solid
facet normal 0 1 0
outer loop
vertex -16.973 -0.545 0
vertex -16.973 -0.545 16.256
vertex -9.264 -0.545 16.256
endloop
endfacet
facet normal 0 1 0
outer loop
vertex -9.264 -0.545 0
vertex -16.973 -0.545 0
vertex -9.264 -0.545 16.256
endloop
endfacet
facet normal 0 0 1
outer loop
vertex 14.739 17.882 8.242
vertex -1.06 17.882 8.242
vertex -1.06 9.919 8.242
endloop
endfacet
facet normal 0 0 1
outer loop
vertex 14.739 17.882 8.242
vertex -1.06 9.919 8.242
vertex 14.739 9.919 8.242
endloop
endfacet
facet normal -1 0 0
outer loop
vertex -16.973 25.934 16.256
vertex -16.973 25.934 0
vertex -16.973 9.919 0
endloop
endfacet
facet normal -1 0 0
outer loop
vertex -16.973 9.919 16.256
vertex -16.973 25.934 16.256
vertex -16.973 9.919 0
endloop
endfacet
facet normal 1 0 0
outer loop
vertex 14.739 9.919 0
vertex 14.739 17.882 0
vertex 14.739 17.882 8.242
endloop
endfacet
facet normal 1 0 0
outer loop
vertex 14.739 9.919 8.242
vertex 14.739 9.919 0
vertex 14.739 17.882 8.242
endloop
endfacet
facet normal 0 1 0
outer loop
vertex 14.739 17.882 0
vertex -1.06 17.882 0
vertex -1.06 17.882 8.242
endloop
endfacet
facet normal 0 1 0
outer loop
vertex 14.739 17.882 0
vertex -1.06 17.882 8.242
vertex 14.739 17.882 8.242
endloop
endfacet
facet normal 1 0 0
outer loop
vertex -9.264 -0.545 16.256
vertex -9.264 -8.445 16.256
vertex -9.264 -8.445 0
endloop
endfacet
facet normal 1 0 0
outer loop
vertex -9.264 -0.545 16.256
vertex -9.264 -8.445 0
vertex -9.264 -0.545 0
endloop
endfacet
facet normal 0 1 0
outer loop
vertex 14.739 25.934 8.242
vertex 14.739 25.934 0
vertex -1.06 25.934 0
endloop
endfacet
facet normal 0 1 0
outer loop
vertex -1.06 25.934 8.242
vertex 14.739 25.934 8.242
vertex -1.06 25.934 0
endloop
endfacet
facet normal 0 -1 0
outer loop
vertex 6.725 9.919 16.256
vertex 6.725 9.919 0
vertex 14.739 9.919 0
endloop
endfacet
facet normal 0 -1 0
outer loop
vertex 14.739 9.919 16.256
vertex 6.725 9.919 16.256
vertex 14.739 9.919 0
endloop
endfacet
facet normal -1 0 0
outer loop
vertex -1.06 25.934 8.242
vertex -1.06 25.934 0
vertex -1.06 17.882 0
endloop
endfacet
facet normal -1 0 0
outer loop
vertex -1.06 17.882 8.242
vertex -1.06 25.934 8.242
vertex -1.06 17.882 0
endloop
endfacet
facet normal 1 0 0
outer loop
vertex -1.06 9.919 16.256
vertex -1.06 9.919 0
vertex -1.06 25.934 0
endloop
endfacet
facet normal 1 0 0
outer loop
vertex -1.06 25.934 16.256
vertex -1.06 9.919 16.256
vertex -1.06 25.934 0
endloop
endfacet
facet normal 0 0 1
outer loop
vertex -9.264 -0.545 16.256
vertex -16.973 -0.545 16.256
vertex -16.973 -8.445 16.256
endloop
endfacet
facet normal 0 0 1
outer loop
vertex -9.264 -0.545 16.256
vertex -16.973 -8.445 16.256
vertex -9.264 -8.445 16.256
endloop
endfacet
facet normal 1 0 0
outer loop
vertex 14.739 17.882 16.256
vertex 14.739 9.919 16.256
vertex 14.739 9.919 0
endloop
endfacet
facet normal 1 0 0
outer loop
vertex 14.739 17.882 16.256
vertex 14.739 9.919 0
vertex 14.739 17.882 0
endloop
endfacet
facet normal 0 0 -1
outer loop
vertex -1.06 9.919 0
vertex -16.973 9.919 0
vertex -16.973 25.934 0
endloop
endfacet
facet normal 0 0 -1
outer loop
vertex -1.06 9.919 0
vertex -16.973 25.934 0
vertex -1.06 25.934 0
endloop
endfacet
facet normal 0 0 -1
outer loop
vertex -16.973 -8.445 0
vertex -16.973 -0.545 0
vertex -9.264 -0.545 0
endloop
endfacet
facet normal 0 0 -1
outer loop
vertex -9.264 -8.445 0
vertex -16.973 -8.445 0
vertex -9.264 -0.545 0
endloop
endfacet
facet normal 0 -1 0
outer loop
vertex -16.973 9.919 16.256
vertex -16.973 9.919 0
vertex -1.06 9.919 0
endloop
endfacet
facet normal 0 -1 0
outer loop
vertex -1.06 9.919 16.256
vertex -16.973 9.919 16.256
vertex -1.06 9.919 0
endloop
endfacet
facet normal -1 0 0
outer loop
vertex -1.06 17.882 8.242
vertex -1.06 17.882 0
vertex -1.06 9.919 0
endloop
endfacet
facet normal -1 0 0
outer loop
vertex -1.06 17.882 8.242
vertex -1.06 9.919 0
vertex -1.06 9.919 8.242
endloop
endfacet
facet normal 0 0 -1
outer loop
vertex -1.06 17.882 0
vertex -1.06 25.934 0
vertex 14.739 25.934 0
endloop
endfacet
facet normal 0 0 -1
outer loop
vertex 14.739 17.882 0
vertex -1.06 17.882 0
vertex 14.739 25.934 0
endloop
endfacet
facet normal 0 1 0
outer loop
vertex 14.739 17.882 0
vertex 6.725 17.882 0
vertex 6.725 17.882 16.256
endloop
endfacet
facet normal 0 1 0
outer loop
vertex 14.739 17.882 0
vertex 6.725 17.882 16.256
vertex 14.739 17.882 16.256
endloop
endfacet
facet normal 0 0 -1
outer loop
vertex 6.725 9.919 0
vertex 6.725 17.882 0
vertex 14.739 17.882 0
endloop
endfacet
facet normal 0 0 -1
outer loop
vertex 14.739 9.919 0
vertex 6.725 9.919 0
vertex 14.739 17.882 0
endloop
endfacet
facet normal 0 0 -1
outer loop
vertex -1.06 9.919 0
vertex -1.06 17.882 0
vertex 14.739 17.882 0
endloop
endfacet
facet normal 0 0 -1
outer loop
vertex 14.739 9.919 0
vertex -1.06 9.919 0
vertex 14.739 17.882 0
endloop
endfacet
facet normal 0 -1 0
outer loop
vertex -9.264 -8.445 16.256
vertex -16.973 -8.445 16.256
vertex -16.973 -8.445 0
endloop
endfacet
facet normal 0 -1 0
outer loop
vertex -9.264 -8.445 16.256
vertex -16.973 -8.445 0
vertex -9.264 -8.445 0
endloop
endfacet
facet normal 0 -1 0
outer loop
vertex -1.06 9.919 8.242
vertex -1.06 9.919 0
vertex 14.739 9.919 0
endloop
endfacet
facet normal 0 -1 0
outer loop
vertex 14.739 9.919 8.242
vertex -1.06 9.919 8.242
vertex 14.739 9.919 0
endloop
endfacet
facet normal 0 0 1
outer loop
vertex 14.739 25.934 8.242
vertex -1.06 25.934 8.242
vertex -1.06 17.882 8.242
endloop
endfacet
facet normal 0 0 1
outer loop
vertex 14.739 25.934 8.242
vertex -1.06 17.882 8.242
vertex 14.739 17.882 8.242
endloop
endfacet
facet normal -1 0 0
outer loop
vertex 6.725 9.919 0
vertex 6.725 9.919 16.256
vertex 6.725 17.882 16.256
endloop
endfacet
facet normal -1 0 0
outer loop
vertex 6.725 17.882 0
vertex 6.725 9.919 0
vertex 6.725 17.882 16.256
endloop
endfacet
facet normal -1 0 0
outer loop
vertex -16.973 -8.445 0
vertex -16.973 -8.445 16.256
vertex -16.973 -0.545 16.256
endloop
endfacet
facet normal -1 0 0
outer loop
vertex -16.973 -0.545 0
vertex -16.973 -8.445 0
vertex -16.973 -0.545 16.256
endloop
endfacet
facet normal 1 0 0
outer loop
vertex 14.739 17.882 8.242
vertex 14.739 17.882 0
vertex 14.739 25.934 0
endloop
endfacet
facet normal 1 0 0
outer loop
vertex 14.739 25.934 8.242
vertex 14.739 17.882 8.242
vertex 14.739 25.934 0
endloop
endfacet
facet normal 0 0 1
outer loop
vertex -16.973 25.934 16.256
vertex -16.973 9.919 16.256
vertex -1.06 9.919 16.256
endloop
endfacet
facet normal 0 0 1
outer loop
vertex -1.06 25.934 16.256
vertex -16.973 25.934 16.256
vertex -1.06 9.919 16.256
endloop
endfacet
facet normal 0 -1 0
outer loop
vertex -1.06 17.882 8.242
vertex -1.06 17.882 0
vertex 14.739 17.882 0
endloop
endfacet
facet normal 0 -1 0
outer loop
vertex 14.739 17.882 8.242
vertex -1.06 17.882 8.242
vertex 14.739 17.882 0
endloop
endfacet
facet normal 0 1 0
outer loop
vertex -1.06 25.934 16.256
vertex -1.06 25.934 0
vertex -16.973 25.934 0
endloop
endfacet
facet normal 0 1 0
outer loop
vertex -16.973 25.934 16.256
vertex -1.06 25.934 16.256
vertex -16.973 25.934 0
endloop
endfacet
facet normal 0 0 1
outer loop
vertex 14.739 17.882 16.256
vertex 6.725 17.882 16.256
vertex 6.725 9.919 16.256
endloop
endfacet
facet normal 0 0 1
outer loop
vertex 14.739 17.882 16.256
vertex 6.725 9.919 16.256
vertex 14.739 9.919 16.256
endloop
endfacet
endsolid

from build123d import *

# Parameters (mm, degrees)
F0_W     = 7.7089
F0_H     = 7.8994
F1_DEPTH = 16.256
F2_DEPTH = 16.256
F0_W_2   = 8.0137
F0_H_2   = 7.9629
F3_DEPTH = 16.256
F4_DEPTH = 8.2423
F5_DEPTH = 7.9629


with BuildPart() as f1:
    # F0 (on Top) → F1 (new body)
    with BuildSketch(Plane.XY):
        with Locations((-13.1188610815, -4.4951643029)):
            Rectangle(F0_W, F0_H)
    extrude(amount=F1_DEPTH)


with BuildPart() as f2:
    # F0 (on Top) → F2 (new body)
    with BuildSketch(Plane.XY):
        Polygon((-16.9733110815, 25.9340356971), (-16.9733110815, 9.9193356971), (-9.2644110815, 9.9193356971), (-1.0602110815, 9.9193356971), (-1.0602110815, 17.8822356971), (-1.0602110815, 25.9340356971), align=None)
    extrude(amount=F2_DEPTH)


with BuildPart() as f3:
    # F0 (on Top) → F3 (new body)
    with BuildSketch(Plane.XY):
        with Locations((10.7317389185, 13.9007856971)):
            Rectangle(F0_W_2, F0_H_2)
    extrude(amount=F3_DEPTH)


with BuildPart() as f4:
    # F0 (on Top) → F4 (new body)
    with BuildSketch(Plane.XY):
        Polygon((14.7385889185, 25.9340356971), (-1.0602110815, 25.9340356971), (-1.0602110815, 17.8822356971), (6.7248889185, 17.8822356971), (14.7385889185, 17.8822356971), align=None)
    extrude(amount=F4_DEPTH)


with BuildPart() as f5:
    # F5 (new, through all): a face of the model
    f5_faces = [f4.part.faces().sort_by_distance(p)[0] for p in [
        (6.8391889185, 17.8822356971, 4.12115),
    ]]
    extrude(f5_faces, amount=F5_DEPTH)


solid = Compound([f1.part, f2.part, f3.part, f4.part, f5.part])
